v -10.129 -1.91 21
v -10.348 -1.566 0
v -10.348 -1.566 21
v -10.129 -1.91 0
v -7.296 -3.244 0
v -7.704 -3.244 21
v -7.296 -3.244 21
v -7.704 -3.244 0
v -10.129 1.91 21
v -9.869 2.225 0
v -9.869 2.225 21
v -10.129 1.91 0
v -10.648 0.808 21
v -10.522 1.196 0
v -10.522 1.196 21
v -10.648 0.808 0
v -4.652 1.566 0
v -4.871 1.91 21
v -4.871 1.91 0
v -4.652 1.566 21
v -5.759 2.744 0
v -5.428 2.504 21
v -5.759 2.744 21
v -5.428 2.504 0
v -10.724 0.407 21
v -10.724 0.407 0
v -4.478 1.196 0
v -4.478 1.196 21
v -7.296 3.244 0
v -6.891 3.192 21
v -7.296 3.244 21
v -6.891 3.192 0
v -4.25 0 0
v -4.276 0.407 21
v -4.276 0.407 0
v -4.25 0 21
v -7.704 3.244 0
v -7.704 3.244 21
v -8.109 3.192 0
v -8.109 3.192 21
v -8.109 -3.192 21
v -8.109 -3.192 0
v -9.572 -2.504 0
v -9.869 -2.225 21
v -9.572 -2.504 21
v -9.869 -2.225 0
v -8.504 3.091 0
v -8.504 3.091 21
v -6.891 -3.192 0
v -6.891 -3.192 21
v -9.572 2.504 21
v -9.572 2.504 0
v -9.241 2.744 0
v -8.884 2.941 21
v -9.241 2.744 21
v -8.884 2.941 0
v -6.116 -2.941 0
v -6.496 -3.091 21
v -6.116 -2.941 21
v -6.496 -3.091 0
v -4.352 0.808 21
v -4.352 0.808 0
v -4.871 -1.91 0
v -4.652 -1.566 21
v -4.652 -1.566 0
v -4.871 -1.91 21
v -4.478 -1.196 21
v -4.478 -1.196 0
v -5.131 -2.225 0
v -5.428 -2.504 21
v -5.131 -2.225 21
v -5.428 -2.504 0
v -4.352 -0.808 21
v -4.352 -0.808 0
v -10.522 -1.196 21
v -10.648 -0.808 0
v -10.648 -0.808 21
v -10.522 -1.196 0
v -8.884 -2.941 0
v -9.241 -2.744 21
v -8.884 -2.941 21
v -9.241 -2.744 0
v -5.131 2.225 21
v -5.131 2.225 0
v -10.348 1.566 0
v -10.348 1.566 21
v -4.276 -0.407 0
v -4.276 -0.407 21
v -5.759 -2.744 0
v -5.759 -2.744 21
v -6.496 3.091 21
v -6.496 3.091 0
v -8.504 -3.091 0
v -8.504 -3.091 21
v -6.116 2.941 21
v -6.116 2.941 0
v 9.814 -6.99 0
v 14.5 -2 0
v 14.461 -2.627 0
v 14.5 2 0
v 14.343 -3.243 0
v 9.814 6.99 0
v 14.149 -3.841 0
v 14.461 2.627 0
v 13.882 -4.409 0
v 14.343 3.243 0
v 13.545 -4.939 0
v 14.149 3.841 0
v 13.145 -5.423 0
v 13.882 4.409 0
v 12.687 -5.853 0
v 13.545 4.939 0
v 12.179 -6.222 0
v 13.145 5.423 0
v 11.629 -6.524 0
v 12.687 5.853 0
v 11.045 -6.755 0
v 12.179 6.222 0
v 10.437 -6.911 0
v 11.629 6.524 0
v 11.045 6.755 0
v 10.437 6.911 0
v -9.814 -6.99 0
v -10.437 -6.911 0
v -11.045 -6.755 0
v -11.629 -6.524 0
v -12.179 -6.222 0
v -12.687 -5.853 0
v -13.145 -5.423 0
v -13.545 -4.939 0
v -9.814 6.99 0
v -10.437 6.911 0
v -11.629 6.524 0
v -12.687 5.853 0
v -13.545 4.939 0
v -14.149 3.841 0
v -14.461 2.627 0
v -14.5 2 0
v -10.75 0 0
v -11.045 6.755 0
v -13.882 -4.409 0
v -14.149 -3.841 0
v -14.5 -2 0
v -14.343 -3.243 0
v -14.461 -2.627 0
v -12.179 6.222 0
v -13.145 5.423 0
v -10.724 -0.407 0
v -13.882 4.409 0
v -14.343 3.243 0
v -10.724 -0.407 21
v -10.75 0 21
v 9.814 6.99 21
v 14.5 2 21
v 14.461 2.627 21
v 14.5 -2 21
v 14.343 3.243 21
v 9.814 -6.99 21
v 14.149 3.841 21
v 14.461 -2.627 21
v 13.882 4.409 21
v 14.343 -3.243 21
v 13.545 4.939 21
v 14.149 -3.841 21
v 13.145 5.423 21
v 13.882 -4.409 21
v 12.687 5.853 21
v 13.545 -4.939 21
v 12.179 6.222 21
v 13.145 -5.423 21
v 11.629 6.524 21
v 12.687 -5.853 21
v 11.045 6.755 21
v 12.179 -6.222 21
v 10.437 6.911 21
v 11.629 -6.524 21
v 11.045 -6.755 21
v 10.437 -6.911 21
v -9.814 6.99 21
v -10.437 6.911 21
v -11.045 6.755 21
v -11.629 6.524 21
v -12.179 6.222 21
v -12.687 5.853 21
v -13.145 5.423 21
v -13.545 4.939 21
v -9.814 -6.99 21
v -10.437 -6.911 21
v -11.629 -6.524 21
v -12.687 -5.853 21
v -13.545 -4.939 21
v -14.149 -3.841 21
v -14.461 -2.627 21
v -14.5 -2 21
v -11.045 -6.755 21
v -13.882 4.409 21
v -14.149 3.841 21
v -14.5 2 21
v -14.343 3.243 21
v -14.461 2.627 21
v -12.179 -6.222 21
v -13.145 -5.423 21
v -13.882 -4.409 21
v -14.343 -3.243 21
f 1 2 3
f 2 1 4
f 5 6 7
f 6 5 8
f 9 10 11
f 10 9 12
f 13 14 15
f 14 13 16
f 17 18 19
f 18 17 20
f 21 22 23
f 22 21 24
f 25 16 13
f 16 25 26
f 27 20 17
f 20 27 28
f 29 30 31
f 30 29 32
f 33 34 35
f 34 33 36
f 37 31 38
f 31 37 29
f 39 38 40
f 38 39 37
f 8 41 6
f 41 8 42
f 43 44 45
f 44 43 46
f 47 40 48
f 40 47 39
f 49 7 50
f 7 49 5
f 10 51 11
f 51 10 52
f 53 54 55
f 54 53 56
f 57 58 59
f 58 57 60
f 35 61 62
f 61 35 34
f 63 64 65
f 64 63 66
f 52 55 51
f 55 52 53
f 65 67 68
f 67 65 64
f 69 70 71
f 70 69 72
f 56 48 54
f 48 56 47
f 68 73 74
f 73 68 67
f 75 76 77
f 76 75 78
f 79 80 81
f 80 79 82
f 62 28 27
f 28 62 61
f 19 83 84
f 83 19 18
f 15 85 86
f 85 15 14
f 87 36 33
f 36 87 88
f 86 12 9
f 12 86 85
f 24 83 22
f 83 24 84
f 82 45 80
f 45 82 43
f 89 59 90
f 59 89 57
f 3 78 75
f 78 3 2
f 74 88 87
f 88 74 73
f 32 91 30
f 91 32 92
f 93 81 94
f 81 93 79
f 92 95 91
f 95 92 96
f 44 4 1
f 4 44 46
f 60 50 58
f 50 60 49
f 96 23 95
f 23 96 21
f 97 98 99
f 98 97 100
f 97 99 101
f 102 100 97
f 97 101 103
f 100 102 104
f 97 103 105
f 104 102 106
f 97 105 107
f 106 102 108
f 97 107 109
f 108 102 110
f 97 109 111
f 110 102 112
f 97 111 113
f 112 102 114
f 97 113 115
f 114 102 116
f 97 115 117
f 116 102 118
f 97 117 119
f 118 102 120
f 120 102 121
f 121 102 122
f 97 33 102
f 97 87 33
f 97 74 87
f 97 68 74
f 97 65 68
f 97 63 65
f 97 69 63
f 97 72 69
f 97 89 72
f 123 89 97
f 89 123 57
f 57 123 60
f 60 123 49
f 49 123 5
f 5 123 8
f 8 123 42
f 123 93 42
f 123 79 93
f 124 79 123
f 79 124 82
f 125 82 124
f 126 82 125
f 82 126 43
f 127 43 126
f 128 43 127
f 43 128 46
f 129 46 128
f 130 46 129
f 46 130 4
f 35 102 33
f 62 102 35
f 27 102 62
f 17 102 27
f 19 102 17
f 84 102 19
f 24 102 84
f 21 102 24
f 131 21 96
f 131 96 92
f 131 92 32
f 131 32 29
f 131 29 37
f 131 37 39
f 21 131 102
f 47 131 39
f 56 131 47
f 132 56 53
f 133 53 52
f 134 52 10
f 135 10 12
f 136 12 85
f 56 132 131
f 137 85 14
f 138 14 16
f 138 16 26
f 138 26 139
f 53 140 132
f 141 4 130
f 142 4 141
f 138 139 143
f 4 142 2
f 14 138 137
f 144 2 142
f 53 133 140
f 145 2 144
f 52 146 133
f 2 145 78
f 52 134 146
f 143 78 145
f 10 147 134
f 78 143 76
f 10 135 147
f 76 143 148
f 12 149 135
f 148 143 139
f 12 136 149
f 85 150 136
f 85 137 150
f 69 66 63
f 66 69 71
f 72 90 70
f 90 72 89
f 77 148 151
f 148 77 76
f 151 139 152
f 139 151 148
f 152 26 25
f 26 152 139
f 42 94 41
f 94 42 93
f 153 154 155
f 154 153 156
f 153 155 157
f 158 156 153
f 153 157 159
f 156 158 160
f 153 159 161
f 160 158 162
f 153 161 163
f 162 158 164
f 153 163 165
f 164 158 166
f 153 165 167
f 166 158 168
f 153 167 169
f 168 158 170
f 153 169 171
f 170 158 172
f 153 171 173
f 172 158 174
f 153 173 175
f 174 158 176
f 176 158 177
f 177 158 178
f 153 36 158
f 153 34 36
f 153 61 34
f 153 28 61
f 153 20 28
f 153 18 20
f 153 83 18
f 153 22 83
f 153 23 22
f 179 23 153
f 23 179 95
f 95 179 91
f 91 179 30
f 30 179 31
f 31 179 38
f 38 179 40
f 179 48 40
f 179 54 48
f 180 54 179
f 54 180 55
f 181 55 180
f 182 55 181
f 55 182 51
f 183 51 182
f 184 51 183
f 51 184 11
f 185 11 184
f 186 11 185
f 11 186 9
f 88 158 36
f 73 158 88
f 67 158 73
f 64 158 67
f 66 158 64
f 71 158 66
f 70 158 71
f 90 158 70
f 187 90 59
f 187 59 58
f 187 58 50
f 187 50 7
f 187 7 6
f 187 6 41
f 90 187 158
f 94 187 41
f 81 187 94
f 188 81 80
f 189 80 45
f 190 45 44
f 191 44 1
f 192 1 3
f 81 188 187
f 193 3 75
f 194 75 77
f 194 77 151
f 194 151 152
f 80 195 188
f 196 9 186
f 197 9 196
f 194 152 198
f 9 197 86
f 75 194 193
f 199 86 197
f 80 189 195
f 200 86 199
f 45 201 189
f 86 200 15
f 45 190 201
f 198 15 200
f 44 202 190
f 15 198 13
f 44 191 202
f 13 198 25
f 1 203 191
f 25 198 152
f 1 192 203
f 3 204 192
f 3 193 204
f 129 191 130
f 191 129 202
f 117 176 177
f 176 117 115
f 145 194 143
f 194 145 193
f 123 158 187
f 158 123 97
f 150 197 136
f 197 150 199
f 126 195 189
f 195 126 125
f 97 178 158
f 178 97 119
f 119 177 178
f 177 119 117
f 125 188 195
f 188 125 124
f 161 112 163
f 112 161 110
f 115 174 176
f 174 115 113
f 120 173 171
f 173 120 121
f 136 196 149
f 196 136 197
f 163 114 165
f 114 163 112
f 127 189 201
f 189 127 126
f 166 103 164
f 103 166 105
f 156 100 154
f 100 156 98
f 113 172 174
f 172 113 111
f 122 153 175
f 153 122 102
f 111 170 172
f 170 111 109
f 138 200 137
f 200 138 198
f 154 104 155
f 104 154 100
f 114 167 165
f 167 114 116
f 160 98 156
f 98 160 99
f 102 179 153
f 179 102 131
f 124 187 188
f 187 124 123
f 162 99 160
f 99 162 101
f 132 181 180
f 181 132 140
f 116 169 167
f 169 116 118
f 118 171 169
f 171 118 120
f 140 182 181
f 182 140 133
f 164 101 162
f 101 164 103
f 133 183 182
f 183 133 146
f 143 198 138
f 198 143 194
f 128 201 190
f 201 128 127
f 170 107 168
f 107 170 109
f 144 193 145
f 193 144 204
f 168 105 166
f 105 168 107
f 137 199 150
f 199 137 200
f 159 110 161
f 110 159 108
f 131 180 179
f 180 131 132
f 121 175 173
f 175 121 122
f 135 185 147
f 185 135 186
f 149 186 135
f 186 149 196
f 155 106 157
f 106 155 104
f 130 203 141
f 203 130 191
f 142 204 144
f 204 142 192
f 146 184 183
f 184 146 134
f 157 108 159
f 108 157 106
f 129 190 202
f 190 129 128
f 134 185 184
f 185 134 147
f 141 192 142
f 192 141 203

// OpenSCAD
$fn = 50;


difference() {
	union() {
		hull() {
			translate(v = [-9.5000000000, 2.0000000000, 0]) {
				cylinder(h = 21, r = 5);
			}
			translate(v = [9.5000000000, 2.0000000000, 0]) {
				cylinder(h = 21, r = 5);
			}
			translate(v = [-9.5000000000, -2.0000000000, 0]) {
				cylinder(h = 21, r = 5);
			}
			translate(v = [9.5000000000, -2.0000000000, 0]) {
				cylinder(h = 21, r = 5);
			}
		}
	}
	union() {
		translate(v = [-7.5000000000, 0.0000000000, 0]) {
			cylinder(h = 21, r = 3.2500000000);
		}
		translate(v = [-7.5000000000, 0.0000000000, 0]) {
			cylinder(h = 21, r = 1.8000000000);
		}
		translate(v = [-7.5000000000, 0.0000000000, 0]) {
			cylinder(h = 21, r = 1.8000000000);
		}
		translate(v = [-7.5000000000, 0.0000000000, 0]) {
			cylinder(h = 21, r = 1.8000000000);
		}
	}
}
